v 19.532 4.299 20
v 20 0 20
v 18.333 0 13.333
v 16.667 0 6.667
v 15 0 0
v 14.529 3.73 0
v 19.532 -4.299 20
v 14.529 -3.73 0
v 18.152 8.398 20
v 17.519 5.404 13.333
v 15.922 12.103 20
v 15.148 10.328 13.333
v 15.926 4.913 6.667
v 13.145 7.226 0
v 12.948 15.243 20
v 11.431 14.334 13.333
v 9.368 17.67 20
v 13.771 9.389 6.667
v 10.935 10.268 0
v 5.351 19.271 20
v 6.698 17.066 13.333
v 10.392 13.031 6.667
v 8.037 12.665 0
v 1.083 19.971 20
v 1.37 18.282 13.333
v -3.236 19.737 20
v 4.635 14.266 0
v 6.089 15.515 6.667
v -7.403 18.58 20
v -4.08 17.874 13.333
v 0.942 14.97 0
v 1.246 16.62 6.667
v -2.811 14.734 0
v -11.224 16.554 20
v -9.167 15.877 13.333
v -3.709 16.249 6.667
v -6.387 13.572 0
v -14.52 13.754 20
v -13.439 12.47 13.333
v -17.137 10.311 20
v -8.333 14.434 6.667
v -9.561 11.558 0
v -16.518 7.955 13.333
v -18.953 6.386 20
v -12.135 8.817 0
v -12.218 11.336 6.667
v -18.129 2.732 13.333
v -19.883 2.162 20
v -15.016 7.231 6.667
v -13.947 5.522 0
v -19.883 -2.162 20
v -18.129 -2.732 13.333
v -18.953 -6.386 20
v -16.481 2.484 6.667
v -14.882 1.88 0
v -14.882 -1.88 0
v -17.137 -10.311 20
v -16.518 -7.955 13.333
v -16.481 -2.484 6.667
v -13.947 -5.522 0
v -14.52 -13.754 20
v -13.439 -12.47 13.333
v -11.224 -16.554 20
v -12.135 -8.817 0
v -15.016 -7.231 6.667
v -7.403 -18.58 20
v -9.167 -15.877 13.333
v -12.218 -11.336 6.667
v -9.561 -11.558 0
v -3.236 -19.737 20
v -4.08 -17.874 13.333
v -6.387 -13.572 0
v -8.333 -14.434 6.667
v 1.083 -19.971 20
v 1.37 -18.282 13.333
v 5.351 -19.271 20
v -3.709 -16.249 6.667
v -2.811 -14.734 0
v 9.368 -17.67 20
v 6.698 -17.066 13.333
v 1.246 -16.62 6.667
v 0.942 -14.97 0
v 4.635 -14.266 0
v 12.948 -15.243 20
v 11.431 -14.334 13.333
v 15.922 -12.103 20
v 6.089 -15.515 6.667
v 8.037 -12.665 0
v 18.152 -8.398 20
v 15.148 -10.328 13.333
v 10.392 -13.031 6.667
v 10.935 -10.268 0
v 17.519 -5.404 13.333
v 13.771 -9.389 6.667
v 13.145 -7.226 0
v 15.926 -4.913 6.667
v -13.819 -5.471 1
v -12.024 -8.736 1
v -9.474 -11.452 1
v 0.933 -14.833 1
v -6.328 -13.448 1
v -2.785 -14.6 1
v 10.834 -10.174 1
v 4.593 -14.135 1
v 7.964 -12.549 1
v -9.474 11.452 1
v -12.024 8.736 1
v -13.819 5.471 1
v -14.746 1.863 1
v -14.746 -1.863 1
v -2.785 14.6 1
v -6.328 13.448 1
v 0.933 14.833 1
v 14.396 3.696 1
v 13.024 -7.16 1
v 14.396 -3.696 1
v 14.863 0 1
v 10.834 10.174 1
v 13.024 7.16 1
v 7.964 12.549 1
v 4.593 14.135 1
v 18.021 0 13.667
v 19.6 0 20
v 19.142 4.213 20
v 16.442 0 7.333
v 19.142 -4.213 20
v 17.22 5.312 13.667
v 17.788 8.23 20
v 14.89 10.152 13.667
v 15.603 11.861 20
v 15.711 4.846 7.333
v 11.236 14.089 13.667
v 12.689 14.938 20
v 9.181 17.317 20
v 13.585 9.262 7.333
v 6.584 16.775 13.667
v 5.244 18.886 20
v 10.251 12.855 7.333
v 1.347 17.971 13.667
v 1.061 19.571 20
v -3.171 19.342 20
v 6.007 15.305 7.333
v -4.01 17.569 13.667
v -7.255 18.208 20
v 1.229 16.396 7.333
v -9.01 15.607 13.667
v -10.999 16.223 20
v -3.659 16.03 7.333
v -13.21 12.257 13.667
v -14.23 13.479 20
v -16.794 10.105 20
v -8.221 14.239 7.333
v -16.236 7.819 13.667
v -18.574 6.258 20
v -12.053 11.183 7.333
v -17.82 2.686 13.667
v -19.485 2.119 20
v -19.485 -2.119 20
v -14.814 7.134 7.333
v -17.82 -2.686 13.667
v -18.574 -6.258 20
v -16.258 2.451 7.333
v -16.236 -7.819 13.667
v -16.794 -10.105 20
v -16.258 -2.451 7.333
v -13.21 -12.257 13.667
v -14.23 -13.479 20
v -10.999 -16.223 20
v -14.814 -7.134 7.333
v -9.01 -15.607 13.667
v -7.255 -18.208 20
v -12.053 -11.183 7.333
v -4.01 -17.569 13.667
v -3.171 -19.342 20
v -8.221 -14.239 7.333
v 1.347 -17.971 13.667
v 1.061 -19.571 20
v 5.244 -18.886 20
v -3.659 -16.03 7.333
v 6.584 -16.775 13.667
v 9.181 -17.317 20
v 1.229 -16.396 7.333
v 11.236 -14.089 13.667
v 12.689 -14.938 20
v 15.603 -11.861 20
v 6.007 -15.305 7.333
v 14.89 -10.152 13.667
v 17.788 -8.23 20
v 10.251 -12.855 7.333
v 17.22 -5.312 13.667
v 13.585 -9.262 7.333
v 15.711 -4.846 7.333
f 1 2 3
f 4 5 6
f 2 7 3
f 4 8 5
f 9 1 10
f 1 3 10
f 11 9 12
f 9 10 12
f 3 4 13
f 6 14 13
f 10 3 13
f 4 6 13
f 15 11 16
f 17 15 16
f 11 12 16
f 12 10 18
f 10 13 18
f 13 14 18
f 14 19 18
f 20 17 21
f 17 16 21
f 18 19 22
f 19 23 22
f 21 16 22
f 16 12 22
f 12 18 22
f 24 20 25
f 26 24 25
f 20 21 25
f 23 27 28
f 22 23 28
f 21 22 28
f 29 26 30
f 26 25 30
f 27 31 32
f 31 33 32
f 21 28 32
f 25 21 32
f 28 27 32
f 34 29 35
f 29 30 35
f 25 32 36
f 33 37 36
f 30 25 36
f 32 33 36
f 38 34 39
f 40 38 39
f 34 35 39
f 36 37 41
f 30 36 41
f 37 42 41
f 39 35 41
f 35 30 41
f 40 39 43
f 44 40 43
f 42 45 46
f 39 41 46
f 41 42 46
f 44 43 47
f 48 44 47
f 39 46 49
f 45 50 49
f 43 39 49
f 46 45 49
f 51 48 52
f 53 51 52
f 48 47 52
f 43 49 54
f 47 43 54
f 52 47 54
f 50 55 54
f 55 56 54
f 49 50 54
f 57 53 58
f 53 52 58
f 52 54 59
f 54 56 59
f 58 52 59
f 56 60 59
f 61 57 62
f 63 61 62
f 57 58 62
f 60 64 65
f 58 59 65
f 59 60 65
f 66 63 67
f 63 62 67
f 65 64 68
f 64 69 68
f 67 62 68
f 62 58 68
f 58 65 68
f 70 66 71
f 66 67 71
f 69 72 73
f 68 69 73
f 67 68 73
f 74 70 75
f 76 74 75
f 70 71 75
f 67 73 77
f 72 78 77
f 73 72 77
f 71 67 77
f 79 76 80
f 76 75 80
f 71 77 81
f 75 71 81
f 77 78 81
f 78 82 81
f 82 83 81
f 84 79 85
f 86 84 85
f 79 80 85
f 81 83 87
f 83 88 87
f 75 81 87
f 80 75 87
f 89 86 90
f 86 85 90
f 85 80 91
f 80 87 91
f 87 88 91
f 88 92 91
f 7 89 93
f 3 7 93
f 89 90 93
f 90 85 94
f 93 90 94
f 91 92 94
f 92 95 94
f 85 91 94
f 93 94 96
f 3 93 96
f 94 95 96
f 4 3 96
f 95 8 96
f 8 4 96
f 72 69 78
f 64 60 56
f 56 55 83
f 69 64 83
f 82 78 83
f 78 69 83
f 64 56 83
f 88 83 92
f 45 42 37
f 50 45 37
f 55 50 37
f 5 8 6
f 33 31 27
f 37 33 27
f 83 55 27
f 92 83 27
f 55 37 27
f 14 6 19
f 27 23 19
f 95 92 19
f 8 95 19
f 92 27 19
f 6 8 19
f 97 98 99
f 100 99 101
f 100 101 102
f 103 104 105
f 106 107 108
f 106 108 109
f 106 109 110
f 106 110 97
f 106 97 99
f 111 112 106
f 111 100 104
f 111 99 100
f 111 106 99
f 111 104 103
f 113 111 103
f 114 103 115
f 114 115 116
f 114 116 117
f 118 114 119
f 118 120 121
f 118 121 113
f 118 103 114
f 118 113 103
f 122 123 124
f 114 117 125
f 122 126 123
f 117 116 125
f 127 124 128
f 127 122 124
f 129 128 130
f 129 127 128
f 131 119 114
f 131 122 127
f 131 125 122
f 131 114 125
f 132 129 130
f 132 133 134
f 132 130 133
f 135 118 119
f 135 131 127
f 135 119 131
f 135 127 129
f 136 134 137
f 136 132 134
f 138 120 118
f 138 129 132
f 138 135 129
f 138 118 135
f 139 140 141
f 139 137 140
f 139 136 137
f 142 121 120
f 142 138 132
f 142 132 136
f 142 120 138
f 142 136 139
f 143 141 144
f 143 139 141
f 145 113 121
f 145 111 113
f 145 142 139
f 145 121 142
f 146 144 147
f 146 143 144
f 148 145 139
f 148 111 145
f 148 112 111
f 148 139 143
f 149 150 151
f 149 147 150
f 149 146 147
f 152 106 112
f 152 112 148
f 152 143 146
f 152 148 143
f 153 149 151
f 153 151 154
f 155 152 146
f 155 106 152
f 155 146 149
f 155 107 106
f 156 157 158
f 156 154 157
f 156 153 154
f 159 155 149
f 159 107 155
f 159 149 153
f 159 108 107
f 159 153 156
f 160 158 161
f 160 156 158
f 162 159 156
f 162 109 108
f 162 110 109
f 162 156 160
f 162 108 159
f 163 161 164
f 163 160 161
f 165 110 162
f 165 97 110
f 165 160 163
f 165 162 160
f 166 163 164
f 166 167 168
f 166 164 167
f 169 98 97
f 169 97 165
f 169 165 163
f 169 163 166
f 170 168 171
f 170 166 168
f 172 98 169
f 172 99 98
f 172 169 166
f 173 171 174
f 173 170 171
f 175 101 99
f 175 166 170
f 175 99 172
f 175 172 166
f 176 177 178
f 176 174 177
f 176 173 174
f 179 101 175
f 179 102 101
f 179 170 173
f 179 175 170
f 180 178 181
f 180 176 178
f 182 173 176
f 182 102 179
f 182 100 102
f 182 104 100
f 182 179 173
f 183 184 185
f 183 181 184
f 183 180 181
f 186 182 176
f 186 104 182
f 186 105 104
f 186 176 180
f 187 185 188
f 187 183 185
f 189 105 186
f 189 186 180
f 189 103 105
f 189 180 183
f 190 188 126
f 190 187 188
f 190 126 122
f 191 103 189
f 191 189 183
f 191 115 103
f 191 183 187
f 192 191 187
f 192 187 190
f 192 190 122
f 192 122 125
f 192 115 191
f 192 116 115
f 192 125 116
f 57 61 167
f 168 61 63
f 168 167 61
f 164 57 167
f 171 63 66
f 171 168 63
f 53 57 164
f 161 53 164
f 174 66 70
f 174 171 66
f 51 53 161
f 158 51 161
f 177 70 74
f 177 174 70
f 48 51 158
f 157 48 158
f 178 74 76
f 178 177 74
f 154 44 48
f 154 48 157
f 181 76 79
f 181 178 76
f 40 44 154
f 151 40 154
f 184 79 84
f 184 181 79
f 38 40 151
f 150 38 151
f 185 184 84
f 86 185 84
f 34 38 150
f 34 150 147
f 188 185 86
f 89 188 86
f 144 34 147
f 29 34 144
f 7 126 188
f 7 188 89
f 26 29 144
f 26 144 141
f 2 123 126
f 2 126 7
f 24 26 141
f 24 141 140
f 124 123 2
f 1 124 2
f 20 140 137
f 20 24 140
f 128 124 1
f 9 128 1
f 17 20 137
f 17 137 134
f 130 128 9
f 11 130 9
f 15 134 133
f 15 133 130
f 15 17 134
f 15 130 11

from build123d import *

# Parameters (mm, degrees)
F0_R     = 20
F1_DEPTH = 20
F2_SIZE2 = 4.99999
F2_SIZE  = 19.99999
F3_R     = 19.6
F4_DEPTH = 19
F4_TAPER = 14


# Not quite as in the source:
# - a fillet or chamfer is up to 0.001 mm smaller than in the source, because OpenCascade refuses the exact size


with BuildPart() as f1:
    # F0 (on Top) → F1 (new body)
    with BuildSketch(Plane.XY):
        Circle(F0_R)
    extrude(amount=F1_DEPTH)

    # F2 (size 20 and 5 in the source; OpenCascade refuses exactly that, so slightly less here)
    f2_edges = [f1.edges().sort_by_distance(p)[0] for p in [
        (-20, 0, 0),
    ]]
    f2_side = f1.faces().sort_by_distance((-20, 0, 10))[0]
    chamfer(f2_edges, length=F2_SIZE, length2=F2_SIZE2, reference=f2_side)

    # F3 (on face) → F4 (cut)
    with BuildSketch(Plane.XY.offset(20)):
        Circle(F3_R)
    extrude(amount=-F4_DEPTH, taper=F4_TAPER, mode=Mode.SUBTRACT)


solid = f1.part
